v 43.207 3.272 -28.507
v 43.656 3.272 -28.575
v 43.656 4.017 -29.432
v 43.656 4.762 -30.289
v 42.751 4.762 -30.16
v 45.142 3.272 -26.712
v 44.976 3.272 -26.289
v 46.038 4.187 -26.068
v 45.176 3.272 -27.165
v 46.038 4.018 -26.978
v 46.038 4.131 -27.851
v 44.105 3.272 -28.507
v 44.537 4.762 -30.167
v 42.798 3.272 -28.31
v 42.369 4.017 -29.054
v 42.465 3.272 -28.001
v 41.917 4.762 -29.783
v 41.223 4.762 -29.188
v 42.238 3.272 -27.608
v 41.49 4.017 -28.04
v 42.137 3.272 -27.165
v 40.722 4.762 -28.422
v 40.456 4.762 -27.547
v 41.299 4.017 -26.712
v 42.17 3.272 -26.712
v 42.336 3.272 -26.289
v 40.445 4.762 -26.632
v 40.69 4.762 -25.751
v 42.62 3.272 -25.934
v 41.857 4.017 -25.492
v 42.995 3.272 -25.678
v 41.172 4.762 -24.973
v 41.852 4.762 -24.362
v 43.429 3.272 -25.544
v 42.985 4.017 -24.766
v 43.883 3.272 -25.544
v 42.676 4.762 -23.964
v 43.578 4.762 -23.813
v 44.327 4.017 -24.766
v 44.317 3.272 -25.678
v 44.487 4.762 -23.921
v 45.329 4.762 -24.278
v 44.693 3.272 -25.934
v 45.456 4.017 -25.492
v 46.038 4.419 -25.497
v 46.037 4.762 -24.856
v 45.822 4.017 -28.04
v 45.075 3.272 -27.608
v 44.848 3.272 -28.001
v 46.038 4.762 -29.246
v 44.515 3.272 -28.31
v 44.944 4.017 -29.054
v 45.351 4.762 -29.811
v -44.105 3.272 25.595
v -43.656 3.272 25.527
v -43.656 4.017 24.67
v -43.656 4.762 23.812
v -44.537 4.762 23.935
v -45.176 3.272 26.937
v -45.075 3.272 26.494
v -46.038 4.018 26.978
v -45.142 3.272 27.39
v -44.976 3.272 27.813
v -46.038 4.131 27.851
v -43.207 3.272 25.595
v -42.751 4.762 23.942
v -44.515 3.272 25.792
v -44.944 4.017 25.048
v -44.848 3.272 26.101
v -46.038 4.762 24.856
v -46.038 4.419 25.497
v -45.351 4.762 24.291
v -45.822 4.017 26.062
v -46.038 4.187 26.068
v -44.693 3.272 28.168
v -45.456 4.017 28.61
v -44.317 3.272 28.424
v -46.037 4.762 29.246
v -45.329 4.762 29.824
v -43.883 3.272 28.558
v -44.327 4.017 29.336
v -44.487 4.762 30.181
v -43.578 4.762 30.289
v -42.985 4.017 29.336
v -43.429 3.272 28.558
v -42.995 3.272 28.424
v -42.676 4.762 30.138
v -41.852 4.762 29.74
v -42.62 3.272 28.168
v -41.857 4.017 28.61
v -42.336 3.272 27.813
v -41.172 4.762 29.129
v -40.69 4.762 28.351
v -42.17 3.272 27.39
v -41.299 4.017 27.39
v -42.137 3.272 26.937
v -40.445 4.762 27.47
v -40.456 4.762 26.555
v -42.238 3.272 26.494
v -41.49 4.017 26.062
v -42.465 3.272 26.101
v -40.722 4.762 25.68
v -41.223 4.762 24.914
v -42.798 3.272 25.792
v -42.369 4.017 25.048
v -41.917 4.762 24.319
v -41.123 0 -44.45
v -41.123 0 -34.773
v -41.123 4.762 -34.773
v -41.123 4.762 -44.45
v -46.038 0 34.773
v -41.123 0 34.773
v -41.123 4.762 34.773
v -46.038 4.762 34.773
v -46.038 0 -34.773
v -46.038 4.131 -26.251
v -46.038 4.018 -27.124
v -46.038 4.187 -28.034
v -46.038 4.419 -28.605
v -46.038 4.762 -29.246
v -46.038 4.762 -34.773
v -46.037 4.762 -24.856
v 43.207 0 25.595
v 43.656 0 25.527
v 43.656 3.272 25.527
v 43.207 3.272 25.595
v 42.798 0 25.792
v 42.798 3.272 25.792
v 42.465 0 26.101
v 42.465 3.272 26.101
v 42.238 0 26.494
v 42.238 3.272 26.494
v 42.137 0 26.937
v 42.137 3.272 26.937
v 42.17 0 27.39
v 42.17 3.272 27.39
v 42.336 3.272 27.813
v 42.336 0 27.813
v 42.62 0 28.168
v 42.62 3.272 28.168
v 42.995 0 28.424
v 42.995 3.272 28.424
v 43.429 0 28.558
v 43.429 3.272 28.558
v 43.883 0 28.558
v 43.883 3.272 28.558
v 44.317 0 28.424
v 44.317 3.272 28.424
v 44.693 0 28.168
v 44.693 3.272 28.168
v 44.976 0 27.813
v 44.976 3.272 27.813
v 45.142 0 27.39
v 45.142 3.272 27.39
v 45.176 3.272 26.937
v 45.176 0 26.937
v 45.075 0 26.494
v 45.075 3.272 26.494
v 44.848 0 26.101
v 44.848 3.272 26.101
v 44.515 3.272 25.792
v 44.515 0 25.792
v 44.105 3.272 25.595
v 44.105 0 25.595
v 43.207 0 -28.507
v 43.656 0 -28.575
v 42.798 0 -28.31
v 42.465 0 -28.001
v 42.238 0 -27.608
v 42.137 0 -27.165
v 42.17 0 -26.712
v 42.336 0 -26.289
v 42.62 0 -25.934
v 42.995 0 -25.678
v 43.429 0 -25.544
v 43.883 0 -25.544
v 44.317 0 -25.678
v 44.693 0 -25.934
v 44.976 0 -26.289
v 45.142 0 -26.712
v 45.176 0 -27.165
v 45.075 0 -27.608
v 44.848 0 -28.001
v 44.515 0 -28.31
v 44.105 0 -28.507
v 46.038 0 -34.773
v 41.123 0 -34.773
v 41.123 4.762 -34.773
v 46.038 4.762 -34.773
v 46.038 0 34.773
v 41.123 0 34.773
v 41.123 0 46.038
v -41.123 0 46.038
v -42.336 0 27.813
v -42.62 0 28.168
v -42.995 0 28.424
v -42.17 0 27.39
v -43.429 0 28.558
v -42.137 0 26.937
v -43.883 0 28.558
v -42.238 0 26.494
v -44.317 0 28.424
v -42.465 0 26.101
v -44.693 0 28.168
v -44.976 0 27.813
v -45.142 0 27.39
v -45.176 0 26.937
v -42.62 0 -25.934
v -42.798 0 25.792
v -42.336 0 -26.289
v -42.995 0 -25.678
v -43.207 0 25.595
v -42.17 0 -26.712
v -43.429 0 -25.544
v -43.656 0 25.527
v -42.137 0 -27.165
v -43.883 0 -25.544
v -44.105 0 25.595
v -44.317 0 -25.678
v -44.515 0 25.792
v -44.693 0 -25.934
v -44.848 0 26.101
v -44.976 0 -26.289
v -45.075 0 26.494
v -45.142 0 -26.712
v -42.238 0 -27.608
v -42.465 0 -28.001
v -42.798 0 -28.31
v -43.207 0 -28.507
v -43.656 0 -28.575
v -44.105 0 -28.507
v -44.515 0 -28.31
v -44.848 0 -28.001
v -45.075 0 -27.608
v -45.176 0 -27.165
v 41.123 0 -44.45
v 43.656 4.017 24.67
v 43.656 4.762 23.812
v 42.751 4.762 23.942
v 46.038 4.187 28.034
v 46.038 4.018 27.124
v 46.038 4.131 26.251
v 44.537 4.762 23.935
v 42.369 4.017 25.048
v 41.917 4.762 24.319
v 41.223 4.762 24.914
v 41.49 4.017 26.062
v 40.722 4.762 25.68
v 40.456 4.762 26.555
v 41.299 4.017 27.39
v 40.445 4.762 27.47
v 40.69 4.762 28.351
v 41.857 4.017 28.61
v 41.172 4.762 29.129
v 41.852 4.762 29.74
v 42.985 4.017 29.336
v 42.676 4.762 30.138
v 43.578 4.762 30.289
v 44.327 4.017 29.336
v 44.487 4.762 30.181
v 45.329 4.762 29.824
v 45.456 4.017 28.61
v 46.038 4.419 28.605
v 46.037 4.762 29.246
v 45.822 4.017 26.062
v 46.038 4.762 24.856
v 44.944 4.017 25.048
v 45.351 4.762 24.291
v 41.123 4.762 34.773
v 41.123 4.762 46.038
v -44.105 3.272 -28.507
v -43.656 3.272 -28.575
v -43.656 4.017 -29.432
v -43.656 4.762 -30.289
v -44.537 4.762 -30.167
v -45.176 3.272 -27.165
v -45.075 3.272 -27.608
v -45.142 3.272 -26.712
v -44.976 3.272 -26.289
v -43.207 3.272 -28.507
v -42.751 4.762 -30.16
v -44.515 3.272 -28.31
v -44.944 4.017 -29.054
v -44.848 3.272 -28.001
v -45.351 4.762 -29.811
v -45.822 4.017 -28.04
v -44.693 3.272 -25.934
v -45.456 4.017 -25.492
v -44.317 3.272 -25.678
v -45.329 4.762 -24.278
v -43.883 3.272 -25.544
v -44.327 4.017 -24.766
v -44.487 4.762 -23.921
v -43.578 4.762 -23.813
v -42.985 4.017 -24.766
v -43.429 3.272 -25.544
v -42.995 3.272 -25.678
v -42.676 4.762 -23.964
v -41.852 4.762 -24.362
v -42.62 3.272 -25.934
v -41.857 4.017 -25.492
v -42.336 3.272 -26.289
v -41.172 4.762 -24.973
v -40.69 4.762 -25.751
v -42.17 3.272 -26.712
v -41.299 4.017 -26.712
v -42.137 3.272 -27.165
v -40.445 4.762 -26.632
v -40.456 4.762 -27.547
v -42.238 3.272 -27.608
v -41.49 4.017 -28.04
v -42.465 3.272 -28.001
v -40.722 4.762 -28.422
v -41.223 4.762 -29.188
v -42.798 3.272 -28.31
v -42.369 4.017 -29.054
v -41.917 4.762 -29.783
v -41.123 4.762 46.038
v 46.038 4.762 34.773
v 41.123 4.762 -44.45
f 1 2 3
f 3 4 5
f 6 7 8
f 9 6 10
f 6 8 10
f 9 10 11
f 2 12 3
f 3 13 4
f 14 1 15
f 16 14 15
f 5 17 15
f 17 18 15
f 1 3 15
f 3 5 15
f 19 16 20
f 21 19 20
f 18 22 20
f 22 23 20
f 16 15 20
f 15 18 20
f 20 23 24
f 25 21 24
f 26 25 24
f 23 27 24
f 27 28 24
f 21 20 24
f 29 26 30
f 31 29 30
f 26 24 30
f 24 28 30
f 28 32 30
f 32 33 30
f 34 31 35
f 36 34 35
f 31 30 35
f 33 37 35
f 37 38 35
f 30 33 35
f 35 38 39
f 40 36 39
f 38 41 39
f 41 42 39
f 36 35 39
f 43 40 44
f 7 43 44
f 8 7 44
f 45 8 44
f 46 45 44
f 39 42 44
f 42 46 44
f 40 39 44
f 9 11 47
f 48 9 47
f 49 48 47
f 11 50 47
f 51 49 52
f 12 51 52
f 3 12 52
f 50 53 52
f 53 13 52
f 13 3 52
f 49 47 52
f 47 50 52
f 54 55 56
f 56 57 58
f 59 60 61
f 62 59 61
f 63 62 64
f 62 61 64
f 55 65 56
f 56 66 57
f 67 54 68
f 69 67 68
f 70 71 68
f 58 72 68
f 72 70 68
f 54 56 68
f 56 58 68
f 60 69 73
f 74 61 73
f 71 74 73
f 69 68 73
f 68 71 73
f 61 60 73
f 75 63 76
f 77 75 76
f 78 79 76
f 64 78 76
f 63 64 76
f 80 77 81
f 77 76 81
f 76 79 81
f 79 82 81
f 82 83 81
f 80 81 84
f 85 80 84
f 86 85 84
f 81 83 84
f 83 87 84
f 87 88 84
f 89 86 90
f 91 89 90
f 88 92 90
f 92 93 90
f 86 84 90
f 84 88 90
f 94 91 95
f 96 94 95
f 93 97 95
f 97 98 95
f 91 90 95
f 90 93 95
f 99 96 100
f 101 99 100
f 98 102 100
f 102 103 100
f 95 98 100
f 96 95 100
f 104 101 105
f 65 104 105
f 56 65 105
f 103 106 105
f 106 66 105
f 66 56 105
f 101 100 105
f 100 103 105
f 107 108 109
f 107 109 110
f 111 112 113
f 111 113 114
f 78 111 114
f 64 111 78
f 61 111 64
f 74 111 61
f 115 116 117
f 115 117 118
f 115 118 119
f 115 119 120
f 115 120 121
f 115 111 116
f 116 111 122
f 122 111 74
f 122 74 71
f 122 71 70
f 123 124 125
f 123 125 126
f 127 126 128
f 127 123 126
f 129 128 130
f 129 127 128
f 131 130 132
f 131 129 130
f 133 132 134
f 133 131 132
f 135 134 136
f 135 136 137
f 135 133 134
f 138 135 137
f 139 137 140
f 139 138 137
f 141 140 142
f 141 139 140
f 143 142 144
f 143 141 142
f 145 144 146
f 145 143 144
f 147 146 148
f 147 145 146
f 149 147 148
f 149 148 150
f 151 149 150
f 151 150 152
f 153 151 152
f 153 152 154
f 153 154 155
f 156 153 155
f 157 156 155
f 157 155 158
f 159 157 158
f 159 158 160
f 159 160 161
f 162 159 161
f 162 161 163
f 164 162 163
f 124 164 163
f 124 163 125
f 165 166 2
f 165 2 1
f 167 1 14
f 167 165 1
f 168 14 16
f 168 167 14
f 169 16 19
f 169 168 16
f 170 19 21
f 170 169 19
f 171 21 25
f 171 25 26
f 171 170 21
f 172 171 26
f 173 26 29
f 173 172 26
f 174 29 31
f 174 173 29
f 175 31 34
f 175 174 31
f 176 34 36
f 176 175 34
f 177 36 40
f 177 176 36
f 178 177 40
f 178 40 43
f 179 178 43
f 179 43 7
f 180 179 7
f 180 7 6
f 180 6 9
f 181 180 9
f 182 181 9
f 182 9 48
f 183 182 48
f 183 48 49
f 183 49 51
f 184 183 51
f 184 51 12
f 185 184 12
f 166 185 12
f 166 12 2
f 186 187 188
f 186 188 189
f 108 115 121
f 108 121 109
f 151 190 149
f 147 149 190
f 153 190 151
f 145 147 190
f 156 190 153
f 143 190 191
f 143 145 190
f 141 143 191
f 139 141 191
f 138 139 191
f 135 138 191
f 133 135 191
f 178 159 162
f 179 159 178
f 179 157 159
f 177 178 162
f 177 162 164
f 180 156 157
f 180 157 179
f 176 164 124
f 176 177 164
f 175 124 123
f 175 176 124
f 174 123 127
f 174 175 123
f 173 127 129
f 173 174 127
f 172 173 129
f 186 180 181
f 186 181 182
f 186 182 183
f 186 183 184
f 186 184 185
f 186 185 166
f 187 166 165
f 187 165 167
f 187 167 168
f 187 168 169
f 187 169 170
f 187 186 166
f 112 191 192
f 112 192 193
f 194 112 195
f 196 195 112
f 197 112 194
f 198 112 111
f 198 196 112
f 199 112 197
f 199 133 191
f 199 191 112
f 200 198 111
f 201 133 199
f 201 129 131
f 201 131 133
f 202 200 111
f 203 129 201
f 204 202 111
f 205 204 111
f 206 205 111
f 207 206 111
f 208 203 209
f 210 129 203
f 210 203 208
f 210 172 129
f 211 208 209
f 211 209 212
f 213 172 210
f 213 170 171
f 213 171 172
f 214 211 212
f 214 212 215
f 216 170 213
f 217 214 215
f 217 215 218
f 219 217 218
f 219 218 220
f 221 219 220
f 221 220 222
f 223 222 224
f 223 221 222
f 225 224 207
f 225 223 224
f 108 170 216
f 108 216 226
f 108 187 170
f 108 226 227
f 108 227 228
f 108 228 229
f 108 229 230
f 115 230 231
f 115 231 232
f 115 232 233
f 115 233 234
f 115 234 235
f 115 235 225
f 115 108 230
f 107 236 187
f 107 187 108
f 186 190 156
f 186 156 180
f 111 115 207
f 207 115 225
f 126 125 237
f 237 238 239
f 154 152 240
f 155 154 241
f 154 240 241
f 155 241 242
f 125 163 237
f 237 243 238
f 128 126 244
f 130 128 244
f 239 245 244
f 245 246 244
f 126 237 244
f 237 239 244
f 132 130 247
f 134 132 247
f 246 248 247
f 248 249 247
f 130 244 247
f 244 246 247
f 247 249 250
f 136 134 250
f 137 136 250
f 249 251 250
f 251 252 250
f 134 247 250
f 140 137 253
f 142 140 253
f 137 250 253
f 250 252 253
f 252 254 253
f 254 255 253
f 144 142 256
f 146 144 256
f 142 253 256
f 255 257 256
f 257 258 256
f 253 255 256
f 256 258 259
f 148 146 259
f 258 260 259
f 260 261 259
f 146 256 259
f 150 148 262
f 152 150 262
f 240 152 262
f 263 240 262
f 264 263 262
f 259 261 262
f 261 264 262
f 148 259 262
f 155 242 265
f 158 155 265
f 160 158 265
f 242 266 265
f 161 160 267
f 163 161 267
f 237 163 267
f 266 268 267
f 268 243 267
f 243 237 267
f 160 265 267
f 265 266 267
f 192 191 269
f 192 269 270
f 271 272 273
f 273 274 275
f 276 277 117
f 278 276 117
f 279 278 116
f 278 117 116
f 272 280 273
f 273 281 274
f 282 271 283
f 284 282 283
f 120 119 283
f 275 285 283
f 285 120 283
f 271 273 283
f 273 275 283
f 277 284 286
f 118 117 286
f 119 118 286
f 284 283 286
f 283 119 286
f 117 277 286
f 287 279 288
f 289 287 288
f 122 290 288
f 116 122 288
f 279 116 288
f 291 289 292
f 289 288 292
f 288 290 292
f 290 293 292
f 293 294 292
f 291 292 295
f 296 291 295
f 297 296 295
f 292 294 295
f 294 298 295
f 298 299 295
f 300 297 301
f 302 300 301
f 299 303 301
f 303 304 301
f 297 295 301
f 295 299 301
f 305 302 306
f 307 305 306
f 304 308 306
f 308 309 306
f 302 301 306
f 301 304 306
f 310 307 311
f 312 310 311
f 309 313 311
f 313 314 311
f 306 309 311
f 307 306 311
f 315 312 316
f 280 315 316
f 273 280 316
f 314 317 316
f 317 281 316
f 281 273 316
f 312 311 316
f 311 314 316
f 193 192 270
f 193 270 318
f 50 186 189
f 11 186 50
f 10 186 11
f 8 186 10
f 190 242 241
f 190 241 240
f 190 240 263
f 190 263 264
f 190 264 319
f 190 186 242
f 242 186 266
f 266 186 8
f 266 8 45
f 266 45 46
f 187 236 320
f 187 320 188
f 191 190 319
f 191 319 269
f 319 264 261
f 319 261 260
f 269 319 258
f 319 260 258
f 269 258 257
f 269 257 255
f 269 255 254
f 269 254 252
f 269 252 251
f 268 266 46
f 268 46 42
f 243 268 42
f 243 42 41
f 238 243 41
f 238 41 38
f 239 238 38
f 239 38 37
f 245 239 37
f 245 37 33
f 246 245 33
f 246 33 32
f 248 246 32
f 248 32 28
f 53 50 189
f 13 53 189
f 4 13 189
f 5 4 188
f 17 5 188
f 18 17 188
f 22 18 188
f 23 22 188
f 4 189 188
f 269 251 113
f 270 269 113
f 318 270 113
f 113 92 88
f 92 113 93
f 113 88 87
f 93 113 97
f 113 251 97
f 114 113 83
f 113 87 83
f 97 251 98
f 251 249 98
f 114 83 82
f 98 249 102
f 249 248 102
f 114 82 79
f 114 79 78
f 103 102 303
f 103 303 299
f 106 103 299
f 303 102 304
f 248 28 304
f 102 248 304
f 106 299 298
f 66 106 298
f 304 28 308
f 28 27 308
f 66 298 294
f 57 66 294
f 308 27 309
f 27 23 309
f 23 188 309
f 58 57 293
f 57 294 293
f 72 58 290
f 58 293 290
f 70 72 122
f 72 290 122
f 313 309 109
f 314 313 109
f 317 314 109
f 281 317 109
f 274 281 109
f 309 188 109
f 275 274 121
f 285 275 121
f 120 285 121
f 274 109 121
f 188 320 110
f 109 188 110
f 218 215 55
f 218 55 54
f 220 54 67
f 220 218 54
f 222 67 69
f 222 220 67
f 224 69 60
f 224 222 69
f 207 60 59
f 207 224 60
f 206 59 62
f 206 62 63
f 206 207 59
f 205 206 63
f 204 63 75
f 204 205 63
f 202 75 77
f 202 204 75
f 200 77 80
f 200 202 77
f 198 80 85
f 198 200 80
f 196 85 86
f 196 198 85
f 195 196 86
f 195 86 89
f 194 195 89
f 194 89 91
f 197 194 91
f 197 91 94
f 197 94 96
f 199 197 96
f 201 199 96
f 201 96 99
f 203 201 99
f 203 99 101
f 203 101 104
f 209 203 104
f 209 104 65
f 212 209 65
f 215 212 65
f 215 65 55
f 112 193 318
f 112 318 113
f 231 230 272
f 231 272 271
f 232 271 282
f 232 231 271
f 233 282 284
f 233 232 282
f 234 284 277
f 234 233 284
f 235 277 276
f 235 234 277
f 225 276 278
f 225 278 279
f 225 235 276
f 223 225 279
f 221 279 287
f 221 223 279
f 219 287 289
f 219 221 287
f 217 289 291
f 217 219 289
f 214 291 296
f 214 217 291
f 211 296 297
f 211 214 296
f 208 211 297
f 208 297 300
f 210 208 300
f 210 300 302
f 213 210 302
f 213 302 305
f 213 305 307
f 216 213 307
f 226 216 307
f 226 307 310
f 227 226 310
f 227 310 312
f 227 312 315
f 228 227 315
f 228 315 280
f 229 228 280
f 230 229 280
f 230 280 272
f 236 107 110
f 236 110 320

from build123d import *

# Parameters (mm, degrees)
SKETCH1_R           = 1.524
BOSS_EXTRUDE1_DEPTH = 4.7625
CHAMFER1_SIZE       = 1.490392112
CHAMFER1_SIZE_2     = 1.7145


with BuildPart() as part:
    # Sketch1 → Boss-Extrude1 (new body)
    with BuildSketch(Plane(origin=(0, 0, 0), x_dir=(1, 0, 0), z_dir=(0, 1, 0))):
        Polygon((-41.1226, 44.45), (41.1226, 44.45), (41.1226, 34.7726), (46.0375, 34.7726), (46.0375, -34.7726), (41.1226, -34.7726), (41.1226, -46.0375), (-41.1226, -46.0375), (-41.1226, -34.7726), (-46.0375, -34.7726), (-46.0375, 34.7726), (-41.1226, 34.7726), align=None)
        with Locations(Location((43.65625, 27.051, 0), (0, 0, 90))):
            Circle(SKETCH1_R, mode=Mode.SUBTRACT)
        with Locations(Location((43.65625, -27.051, 0), (0, 0, 90))):
            Circle(SKETCH1_R, mode=Mode.SUBTRACT)
        with Locations(Location((-43.65625, -27.051, 0), (0, 0, 90))):
            Circle(SKETCH1_R, mode=Mode.SUBTRACT)
        with Locations(Location((-43.65625, 27.051, 0), (0, 0, 90))):
            Circle(SKETCH1_R, mode=Mode.SUBTRACT)
    extrude(amount=BOSS_EXTRUDE1_DEPTH)

    # Chamfer1
    # the kernel refuses this chamfer: 1.7145, 1.490392112 mm, written as the material it takes off along each edge
    with BuildSketch(Plane(origin=(43.65625, 4.7625, -27.051), x_dir=(0, 0, -1), z_dir=(1, 0, 0))) as chamfer1_piece_1:
        Polygon((1.524, -CHAMFER1_SIZE), (1.524 + CHAMFER1_SIZE_2, 0), (1.524, 0), align=None)
    revolve(axis=Axis((43.65625, 4.7625, -27.051), (0, 1, 0)), mode=Mode.SUBTRACT)
    with BuildSketch(Plane(origin=(43.65625, 4.7625, 27.051), x_dir=(0, 0, -1), z_dir=(1, 0, 0))) as chamfer1_piece_2:
        Polygon((1.524, -CHAMFER1_SIZE), (1.524 + CHAMFER1_SIZE_2, 0), (1.524, 0), align=None)
    revolve(axis=Axis((43.65625, 4.7625, 27.051), (0, 1, 0)), mode=Mode.SUBTRACT)
    with BuildSketch(Plane(origin=(-43.65625, 4.7625, 27.051), x_dir=(0, 0, -1), z_dir=(1, 0, 0))) as chamfer1_piece_3:
        Polygon((1.524, -CHAMFER1_SIZE), (1.524 + CHAMFER1_SIZE_2, 0), (1.524, 0), align=None)
    revolve(axis=Axis((-43.65625, 4.7625, 27.051), (0, 1, 0)), mode=Mode.SUBTRACT)
    with BuildSketch(Plane(origin=(-43.65625, 4.7625, -27.051), x_dir=(0, 0, -1), z_dir=(1, 0, 0))) as chamfer1_piece_4:
        Polygon((1.524, -CHAMFER1_SIZE), (1.524 + CHAMFER1_SIZE_2, 0), (1.524, 0), align=None)
    revolve(axis=Axis((-43.65625, 4.7625, -27.051), (0, 1, 0)), mode=Mode.SUBTRACT)


solid = part.part
